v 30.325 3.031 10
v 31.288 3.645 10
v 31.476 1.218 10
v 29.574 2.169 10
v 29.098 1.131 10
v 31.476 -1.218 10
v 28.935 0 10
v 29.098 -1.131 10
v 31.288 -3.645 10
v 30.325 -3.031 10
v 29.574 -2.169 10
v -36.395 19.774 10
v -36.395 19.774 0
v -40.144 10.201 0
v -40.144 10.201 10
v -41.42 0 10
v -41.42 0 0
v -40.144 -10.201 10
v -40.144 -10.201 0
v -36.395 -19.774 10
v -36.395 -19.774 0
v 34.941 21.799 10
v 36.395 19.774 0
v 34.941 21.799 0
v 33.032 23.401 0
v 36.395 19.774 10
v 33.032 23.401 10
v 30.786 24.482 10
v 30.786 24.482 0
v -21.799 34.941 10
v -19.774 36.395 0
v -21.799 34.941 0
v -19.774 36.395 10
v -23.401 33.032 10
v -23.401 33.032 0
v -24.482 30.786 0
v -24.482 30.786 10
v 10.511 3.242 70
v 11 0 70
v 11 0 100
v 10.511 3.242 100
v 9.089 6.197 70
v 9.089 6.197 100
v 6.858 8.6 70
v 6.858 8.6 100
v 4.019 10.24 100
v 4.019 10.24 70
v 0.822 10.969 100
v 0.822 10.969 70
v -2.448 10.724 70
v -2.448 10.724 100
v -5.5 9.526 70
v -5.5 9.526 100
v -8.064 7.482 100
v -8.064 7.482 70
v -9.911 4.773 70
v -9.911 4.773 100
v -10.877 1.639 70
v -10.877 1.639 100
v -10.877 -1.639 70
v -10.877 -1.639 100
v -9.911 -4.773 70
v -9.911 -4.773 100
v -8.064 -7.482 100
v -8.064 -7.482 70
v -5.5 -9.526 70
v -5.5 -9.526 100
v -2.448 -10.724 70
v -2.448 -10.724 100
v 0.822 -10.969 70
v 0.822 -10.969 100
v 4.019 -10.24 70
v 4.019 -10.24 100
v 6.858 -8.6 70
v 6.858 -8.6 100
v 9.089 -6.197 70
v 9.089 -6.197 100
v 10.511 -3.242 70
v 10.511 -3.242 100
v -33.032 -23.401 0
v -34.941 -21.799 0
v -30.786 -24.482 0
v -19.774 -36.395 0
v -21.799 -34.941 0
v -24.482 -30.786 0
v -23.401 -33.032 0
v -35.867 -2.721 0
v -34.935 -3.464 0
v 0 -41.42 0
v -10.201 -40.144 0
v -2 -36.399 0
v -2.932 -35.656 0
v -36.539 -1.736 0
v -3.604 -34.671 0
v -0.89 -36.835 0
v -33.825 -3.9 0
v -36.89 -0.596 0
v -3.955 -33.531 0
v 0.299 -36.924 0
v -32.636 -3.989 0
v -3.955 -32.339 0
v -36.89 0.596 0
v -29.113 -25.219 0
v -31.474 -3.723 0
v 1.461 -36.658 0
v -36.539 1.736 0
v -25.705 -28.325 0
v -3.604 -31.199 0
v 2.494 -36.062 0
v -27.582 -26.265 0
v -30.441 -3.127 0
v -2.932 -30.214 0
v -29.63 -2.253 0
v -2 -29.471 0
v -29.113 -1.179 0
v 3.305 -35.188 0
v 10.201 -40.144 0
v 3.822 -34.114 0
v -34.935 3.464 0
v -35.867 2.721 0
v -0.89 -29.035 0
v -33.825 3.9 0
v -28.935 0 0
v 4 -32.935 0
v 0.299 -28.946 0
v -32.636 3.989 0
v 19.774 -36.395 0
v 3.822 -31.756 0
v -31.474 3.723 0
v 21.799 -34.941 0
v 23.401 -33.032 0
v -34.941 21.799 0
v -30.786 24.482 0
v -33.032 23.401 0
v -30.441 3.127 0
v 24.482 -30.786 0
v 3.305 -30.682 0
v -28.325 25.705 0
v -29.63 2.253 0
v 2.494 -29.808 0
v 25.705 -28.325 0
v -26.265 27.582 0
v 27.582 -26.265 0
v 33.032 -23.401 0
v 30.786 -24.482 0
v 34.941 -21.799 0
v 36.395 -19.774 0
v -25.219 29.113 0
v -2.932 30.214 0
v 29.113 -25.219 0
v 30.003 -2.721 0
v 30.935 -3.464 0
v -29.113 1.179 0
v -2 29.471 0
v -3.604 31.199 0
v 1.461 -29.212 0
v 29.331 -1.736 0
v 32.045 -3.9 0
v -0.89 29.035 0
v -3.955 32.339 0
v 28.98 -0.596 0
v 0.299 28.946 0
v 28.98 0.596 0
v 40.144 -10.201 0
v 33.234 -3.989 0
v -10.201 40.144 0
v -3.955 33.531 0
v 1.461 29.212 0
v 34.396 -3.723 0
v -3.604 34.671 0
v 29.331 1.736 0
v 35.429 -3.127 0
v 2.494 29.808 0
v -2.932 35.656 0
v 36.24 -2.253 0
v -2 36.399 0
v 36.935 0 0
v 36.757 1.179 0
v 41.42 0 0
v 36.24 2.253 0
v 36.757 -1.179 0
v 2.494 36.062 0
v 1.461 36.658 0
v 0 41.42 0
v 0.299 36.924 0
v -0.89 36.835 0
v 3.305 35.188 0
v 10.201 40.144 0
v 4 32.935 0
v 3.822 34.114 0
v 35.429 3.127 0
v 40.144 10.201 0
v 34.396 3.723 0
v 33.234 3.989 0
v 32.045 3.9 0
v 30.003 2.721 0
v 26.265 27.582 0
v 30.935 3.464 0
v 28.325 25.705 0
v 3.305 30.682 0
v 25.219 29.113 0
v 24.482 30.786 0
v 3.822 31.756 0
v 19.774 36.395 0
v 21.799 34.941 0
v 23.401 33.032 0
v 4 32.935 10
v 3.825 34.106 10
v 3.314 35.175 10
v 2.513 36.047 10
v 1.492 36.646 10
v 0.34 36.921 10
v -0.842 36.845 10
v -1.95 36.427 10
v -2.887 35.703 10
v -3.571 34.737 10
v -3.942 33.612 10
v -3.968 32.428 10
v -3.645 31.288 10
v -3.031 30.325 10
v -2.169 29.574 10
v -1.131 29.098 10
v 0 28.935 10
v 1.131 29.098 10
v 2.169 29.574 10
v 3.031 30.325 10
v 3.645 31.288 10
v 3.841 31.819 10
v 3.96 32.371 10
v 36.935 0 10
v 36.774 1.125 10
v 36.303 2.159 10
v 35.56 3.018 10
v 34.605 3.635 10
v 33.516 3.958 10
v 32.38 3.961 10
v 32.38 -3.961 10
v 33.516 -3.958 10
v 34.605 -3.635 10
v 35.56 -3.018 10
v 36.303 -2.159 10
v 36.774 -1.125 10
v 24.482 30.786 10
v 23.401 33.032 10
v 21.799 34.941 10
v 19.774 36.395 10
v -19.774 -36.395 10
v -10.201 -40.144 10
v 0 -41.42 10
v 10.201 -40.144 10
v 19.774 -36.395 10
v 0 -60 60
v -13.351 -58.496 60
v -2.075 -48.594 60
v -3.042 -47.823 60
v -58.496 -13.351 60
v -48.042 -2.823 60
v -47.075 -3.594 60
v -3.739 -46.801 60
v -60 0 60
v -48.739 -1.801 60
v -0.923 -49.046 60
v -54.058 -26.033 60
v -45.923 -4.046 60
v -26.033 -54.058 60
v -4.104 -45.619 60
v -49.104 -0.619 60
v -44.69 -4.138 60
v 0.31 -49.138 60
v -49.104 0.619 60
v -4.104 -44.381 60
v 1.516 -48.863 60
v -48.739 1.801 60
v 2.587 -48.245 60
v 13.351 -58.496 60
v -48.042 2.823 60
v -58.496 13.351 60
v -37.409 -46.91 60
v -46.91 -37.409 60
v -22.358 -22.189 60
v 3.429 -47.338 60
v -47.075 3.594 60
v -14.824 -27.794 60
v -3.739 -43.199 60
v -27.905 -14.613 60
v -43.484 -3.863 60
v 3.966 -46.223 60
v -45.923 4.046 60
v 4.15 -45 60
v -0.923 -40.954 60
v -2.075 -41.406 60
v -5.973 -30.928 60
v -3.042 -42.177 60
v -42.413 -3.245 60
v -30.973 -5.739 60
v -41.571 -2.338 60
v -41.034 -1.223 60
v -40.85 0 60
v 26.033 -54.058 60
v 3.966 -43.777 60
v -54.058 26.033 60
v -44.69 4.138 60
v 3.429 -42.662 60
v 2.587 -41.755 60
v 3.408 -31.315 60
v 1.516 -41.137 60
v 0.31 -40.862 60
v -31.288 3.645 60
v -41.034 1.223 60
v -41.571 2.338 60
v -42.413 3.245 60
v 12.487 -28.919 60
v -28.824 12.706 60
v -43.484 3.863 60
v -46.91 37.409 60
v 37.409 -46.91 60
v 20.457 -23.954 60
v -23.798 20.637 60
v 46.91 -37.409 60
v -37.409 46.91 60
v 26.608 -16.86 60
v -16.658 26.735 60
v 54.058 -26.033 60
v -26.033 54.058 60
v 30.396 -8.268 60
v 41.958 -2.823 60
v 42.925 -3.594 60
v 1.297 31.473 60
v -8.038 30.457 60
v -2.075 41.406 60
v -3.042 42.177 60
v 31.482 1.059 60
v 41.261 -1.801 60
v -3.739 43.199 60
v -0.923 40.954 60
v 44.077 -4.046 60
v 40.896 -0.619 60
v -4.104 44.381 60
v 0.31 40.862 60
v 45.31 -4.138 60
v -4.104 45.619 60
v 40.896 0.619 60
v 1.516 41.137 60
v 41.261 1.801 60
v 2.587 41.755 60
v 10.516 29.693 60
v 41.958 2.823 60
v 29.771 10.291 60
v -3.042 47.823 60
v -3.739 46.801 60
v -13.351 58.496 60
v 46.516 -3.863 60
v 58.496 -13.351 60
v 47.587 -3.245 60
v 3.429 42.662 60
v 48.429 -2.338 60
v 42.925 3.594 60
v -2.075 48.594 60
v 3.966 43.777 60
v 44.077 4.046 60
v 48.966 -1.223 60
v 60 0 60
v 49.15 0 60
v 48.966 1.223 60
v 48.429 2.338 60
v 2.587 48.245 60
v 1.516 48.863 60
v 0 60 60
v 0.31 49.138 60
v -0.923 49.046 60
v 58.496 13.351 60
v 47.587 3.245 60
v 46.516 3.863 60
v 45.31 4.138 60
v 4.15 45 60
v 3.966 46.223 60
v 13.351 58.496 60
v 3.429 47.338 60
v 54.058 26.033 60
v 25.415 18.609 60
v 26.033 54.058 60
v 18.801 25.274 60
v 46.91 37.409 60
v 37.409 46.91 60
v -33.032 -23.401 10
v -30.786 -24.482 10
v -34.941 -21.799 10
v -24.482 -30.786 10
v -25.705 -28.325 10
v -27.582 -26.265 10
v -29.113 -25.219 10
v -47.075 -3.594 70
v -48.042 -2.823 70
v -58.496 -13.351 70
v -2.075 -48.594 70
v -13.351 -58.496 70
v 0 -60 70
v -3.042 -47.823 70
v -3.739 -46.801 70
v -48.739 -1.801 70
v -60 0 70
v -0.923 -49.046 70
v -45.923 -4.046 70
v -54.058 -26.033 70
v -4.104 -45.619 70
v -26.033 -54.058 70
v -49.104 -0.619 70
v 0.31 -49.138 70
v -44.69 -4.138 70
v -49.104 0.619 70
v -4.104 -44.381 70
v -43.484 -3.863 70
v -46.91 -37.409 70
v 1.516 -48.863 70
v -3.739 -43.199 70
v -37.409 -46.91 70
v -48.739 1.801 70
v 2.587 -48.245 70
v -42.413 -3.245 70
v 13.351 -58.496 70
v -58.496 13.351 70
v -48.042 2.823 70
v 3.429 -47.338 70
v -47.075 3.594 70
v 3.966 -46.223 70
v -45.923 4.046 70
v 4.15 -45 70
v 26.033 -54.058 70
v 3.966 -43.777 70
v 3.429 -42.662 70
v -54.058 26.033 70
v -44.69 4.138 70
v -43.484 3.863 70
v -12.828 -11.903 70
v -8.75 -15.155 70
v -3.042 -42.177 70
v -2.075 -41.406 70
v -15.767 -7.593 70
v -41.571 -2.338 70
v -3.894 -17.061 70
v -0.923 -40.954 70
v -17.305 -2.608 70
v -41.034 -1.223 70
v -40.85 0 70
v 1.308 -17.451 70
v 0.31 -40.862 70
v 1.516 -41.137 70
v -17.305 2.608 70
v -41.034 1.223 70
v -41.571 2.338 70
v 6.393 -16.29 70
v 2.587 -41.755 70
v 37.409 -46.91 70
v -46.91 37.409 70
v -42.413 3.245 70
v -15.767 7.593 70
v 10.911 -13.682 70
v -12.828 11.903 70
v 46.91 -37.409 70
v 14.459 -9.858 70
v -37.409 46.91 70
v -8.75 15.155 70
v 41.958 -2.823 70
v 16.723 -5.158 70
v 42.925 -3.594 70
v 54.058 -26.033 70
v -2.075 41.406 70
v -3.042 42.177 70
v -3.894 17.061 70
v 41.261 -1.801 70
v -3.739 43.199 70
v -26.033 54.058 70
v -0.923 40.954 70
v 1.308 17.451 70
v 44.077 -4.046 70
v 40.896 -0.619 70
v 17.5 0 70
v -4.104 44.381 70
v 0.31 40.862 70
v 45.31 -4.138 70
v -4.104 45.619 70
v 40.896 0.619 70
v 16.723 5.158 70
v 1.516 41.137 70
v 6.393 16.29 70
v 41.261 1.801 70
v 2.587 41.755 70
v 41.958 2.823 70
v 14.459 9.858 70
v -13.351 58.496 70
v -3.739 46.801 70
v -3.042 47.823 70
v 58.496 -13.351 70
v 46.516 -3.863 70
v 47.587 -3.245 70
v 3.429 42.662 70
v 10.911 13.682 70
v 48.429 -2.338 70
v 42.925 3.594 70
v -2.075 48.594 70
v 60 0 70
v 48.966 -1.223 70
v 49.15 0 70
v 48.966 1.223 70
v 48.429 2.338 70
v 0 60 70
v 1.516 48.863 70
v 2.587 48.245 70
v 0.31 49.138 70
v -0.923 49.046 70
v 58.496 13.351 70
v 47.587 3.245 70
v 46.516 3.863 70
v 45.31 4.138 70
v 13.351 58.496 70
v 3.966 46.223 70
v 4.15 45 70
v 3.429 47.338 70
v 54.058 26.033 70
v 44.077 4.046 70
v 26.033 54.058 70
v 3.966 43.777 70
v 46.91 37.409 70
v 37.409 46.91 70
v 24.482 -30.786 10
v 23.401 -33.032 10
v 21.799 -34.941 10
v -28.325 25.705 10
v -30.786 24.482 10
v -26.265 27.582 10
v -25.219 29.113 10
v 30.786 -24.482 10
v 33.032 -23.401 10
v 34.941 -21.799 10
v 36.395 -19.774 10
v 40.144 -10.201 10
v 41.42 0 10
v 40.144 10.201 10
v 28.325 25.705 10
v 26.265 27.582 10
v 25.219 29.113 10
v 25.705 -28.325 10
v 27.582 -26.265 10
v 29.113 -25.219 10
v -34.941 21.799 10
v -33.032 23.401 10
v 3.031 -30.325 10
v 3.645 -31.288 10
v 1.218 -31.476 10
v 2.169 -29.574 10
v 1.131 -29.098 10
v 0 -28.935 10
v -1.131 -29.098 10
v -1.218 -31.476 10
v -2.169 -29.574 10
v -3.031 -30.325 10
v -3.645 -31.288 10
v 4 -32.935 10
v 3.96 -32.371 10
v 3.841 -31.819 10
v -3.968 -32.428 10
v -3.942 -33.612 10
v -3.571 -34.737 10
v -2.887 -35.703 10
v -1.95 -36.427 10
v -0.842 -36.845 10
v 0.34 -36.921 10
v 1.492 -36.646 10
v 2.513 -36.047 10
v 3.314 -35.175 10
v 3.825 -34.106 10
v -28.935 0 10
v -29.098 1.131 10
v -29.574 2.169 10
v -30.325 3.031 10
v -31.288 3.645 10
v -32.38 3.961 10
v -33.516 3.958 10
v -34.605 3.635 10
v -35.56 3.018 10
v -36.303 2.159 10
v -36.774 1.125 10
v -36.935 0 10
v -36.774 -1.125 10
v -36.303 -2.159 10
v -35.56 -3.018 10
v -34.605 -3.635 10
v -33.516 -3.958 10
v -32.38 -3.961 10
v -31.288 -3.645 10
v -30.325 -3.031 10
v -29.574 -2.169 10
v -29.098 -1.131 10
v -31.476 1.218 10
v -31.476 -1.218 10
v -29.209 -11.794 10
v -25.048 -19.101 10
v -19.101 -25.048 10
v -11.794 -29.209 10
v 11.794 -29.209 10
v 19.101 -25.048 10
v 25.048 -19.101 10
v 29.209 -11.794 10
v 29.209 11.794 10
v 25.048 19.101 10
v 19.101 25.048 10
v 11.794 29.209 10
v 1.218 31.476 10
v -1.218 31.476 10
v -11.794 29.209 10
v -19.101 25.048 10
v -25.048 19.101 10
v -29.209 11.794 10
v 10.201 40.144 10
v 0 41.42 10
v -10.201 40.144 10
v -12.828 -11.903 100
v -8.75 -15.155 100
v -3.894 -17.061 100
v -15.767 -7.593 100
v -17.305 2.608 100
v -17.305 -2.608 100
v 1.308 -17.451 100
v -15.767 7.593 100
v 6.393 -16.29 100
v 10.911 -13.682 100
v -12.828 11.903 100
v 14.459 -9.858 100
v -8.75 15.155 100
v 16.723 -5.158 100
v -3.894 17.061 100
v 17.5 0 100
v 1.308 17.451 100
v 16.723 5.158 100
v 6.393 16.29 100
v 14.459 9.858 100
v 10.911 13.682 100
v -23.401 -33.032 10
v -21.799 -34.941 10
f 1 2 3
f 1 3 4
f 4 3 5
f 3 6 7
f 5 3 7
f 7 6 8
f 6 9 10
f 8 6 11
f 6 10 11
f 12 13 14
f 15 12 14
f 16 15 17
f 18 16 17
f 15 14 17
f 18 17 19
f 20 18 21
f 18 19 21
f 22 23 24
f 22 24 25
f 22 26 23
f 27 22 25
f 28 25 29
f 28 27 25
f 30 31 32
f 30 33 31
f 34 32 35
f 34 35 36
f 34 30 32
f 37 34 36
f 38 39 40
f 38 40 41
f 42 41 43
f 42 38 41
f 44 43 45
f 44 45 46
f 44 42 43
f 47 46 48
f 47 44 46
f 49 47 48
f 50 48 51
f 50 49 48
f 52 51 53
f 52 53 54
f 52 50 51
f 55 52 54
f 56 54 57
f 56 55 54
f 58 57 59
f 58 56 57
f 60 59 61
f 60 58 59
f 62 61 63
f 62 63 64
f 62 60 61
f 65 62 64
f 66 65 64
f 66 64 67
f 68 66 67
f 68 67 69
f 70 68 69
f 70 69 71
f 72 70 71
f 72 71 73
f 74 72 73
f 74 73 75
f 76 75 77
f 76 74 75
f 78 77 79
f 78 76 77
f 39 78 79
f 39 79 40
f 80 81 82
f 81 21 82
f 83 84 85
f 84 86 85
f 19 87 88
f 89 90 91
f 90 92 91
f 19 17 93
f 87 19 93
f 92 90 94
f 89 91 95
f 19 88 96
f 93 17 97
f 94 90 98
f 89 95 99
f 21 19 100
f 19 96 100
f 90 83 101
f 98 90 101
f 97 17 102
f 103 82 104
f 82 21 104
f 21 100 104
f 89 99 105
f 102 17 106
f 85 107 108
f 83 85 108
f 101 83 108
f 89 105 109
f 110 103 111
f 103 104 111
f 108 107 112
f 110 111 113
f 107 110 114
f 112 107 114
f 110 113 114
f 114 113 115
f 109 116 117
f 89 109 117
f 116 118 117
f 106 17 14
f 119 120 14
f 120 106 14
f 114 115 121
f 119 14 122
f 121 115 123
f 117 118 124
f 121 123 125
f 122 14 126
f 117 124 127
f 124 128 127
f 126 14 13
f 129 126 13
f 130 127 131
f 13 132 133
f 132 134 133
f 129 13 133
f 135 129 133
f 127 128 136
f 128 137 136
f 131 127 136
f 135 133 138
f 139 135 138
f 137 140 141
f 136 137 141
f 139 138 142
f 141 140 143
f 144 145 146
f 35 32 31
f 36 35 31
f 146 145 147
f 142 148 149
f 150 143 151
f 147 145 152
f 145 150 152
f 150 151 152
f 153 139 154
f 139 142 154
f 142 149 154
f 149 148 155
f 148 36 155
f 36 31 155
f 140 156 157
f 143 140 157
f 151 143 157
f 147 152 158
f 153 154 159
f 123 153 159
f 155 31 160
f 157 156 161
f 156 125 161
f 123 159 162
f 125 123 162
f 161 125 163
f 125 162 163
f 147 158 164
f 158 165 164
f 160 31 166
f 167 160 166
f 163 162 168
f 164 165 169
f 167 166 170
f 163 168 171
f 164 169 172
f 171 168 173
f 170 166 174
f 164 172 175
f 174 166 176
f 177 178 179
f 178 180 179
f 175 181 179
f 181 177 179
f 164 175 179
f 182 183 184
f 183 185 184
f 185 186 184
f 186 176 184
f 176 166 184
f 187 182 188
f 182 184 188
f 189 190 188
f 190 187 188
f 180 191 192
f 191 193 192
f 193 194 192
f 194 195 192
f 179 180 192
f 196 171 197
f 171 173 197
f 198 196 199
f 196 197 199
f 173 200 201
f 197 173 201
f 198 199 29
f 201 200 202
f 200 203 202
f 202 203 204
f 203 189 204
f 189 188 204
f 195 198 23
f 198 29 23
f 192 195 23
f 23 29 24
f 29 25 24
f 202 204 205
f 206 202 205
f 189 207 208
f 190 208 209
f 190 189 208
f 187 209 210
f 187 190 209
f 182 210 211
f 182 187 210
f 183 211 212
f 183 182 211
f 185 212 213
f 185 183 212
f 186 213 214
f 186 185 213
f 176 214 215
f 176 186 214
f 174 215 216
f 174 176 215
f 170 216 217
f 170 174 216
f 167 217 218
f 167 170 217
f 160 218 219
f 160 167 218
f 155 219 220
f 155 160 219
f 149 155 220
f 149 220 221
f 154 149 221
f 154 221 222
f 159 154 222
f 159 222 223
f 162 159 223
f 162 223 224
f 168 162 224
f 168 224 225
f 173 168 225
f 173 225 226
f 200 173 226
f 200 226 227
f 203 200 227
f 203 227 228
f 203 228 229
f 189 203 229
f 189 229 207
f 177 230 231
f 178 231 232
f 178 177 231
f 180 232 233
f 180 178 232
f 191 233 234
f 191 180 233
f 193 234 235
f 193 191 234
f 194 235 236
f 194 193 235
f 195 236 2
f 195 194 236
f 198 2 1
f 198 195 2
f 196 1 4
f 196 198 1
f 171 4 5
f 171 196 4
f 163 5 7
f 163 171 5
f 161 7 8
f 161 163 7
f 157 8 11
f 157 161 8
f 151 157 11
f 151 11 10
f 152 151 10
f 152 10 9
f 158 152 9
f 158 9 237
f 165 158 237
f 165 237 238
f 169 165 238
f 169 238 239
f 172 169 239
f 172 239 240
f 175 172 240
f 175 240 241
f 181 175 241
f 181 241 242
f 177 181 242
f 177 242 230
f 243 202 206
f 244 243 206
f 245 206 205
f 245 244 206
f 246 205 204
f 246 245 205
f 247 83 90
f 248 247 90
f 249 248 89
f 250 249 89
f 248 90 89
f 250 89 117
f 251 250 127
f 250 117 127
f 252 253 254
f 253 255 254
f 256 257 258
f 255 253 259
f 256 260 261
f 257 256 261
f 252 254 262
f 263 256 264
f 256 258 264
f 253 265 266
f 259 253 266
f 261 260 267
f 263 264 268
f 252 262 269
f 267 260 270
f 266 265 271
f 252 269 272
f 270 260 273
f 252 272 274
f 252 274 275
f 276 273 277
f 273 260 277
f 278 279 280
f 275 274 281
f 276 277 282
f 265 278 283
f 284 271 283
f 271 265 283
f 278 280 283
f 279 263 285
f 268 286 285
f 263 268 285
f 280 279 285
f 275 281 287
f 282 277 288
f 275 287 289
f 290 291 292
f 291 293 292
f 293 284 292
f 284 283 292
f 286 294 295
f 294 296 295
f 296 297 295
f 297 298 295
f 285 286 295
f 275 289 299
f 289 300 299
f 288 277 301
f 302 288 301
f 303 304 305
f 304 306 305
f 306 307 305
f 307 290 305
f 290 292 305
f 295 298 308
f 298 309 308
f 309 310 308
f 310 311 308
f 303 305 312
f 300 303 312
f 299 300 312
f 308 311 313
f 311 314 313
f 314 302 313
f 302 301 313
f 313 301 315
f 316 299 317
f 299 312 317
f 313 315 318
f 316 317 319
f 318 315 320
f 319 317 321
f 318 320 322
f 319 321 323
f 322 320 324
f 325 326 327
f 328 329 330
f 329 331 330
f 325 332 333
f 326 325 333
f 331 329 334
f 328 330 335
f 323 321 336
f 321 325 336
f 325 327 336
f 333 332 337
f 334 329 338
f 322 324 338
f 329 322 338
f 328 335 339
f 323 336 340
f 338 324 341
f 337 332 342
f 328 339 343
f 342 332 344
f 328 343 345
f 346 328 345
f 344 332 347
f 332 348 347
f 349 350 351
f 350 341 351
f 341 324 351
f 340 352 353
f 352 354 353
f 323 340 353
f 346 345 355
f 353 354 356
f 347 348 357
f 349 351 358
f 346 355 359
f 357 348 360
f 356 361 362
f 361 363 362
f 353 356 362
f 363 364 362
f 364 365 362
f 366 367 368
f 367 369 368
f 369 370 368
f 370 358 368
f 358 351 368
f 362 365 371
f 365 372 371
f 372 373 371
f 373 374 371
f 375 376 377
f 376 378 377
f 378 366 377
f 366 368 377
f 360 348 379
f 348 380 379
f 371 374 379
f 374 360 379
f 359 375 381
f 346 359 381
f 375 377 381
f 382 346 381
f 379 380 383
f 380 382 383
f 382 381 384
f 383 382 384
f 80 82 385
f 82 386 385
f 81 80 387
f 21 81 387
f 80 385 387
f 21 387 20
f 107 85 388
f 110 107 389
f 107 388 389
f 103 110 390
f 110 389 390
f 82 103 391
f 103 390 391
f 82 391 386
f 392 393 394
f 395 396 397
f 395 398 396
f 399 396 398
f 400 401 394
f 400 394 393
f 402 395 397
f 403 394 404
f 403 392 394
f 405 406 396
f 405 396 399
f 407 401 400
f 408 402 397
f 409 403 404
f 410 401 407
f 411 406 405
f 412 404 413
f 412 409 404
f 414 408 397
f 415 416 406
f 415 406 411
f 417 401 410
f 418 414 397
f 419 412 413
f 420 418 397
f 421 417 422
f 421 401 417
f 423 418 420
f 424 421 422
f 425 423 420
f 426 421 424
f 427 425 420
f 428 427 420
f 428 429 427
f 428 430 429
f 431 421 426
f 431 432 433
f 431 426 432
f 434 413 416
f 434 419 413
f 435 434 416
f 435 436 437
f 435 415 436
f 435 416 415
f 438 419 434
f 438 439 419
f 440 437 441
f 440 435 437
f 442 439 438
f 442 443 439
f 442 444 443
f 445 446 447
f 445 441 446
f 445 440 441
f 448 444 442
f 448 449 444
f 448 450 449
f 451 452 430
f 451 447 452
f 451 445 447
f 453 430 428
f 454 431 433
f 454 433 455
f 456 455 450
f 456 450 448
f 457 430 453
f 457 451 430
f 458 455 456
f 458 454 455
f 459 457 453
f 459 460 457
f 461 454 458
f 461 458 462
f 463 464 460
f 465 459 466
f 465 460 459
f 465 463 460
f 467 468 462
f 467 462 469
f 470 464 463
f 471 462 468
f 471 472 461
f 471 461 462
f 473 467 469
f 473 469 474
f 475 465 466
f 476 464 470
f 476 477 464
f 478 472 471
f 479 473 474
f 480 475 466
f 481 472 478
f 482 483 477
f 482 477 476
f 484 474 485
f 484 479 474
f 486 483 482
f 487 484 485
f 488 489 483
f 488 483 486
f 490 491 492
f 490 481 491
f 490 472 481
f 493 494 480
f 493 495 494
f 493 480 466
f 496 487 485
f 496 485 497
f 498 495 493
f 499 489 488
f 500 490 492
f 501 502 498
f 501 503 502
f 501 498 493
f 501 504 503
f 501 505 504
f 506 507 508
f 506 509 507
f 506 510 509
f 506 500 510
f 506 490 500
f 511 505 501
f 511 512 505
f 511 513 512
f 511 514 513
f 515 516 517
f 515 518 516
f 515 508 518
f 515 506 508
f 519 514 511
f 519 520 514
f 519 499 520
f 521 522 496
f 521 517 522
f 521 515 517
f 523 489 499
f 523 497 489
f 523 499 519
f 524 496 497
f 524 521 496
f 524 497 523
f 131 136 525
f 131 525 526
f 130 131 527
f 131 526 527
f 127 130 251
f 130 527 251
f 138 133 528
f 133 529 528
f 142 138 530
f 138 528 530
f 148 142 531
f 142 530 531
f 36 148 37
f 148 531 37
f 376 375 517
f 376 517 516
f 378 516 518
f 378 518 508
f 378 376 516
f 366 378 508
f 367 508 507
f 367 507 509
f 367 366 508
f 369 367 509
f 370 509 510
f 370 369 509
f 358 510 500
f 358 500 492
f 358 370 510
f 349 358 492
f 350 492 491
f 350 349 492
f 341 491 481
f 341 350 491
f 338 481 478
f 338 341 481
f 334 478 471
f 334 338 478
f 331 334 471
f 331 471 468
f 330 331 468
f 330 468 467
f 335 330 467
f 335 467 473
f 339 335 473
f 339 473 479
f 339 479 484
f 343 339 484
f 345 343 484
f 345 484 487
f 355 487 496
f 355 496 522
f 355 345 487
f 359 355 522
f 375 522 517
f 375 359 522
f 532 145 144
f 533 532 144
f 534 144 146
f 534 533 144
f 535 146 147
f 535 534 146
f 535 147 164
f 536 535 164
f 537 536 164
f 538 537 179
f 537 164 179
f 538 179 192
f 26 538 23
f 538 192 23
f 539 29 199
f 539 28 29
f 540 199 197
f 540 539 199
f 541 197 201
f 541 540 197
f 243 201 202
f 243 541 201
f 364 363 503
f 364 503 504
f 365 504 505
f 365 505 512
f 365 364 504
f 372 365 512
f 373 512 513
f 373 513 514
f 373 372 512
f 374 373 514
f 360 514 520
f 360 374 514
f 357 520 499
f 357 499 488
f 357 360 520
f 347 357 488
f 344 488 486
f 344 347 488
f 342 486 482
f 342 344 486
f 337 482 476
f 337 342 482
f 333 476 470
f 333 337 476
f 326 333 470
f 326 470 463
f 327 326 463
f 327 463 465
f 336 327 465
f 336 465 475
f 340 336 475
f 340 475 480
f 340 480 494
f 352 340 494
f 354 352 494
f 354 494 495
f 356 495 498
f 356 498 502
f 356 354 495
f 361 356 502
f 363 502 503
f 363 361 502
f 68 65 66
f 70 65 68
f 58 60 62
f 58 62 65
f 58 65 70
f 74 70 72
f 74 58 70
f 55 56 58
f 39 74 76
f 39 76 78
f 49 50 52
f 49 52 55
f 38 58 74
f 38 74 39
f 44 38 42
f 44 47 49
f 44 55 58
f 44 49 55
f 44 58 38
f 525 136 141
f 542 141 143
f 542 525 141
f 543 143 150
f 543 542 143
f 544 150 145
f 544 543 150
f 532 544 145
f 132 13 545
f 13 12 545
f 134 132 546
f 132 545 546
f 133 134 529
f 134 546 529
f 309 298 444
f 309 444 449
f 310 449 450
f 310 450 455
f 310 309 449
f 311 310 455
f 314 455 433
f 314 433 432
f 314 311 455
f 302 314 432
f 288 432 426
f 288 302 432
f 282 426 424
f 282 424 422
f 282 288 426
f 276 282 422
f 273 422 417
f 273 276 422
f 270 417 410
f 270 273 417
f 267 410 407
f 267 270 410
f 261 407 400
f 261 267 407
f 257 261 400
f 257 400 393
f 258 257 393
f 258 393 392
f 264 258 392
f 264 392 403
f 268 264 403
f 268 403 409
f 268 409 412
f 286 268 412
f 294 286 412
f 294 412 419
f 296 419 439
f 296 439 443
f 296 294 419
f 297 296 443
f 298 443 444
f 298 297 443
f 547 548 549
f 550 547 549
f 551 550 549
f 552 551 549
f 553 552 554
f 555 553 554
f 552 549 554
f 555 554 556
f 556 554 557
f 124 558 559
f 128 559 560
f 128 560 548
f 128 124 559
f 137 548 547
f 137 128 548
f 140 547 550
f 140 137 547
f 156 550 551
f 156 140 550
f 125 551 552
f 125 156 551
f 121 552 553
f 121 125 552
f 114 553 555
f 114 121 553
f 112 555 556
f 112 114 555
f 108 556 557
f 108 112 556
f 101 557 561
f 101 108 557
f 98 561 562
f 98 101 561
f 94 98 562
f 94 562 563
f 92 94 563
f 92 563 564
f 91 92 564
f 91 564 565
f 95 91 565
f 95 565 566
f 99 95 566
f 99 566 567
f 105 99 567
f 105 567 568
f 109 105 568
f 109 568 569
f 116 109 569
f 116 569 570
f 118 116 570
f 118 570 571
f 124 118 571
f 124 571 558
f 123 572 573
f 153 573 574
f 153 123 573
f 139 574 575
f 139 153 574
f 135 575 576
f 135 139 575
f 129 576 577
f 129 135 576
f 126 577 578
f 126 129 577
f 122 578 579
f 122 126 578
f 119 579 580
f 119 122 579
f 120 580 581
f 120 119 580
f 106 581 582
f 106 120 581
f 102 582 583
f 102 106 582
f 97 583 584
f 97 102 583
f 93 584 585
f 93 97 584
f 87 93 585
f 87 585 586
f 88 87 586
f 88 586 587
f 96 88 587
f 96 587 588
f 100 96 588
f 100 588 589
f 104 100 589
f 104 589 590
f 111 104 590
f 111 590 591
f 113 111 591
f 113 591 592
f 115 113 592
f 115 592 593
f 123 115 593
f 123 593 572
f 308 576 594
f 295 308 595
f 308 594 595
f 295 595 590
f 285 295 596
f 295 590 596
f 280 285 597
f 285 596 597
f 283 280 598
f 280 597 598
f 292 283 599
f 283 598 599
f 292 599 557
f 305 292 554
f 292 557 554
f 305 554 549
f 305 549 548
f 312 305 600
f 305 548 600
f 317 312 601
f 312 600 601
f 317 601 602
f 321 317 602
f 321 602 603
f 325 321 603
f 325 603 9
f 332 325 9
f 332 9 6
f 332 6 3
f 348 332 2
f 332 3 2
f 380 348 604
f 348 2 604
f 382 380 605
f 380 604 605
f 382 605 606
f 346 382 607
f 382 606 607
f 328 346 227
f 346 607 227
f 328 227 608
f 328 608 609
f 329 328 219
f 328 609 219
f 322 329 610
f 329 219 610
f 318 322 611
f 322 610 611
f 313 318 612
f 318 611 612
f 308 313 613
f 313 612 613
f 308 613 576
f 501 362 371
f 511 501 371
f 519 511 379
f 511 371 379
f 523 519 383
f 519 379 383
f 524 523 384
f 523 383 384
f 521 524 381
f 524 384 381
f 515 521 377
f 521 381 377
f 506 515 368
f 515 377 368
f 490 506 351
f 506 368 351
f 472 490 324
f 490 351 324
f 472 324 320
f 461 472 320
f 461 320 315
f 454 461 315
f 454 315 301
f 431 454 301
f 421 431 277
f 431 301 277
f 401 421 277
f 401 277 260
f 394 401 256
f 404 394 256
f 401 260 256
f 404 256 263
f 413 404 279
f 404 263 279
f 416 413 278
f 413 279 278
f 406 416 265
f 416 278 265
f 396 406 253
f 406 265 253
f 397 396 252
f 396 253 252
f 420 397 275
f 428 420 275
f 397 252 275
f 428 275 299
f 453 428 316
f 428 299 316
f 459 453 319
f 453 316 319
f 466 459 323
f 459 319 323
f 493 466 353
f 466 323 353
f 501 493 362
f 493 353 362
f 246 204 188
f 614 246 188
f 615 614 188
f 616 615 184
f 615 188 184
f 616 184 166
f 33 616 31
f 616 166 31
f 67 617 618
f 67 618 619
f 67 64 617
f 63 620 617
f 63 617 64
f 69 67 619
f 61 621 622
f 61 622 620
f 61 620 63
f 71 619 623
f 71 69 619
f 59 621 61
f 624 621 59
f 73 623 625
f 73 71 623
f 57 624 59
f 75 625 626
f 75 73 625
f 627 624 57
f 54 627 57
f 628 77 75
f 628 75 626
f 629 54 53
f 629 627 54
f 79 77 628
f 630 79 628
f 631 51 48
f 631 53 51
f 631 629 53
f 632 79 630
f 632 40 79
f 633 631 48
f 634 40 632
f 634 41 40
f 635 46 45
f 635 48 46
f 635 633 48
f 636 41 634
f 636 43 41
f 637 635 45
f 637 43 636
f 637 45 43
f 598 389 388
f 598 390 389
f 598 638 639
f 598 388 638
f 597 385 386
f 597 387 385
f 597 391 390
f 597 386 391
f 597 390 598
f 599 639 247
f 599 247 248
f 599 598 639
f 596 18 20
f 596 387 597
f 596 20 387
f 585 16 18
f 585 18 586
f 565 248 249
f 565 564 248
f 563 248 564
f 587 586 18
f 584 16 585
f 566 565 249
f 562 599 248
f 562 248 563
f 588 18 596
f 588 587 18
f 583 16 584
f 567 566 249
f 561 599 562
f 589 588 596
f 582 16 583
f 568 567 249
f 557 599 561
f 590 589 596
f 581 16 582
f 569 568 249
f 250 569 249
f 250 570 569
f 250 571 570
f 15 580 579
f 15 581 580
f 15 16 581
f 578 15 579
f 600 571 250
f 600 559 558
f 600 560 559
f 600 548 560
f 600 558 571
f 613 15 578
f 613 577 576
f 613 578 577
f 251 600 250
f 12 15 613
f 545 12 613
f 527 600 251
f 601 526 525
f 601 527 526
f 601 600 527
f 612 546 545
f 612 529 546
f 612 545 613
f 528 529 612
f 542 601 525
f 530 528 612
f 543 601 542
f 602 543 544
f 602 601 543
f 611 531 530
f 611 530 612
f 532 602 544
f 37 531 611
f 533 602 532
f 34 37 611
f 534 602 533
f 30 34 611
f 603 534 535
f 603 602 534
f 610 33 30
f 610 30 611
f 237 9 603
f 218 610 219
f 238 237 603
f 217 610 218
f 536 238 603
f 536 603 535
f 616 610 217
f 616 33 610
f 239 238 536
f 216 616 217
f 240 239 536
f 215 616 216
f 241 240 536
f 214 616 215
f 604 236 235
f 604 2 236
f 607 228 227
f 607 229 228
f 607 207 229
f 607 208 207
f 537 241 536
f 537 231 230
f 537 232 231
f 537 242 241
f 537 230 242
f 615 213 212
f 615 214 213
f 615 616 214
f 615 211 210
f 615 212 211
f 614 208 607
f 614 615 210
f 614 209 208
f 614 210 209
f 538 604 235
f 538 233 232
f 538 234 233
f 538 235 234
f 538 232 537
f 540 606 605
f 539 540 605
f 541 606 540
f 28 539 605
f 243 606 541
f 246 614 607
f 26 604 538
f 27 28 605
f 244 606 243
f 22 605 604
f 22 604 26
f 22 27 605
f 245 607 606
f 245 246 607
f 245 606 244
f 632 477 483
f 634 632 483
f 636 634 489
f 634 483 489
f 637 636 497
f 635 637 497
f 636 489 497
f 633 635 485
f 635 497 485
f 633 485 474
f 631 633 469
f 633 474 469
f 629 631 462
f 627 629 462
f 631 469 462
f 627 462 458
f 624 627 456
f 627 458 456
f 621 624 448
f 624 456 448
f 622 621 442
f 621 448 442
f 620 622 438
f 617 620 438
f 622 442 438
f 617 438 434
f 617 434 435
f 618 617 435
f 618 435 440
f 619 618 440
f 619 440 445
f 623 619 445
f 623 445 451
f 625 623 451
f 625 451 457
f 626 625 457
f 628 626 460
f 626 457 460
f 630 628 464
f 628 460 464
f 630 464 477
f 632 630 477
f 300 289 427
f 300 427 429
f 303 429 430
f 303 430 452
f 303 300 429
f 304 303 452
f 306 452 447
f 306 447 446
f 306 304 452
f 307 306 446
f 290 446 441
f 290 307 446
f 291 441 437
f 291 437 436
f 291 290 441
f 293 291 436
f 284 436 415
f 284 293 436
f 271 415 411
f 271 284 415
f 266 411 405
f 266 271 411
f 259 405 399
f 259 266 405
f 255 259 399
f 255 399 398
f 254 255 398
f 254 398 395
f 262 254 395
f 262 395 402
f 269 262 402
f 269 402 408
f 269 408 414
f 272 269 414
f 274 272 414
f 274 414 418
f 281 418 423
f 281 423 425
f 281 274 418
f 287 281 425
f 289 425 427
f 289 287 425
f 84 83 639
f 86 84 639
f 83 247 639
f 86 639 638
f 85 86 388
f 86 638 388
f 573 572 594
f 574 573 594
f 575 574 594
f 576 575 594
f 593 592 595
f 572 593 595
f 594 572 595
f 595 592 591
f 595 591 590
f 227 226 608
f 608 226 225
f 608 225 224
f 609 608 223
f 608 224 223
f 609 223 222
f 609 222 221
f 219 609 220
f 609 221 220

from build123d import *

# Parameters (mm, degrees)
SKETCH1_W           = 50
SKETCH1_H           = 50
SKETCH1_R           = 4
BOSS_EXTRUDE1_DEPTH = 10
FILLET1_R           = 10
FILLET2_R           = 10
SKETCH2_R           = 31.5
BOSS_EXTRUDE2_DEPTH = 50
SKETCH3_R           = 60
SKETCH3_R_2         = 4.15
BOSS_EXTRUDE3_DEPTH = 10
SKETCH4_R           = 17.5
SKETCH4_R_2         = 11
BOSS_EXTRUDE4_DEPTH = 30


with BuildPart() as part:
    # Sketch1 → Boss-Extrude1 (new body)
    # profile 1 of 5: a face of its own
    with BuildSketch(Plane.XY):
        Rectangle(SKETCH1_W, SKETCH1_H)
    # profile 2 of 5: a face of its own
    with BuildSketch(Plane.XY):
        with BuildLine():
            Line((-25, -25), (-25, 25))
            Line((-25, 25), (-33.024481828, 25))
            ThreePointArc((-33.024481828, 25), (-41.42, 0), (-33.024481828, -25))
            Line((-33.024481828, -25), (-25, -25))
        make_face()
        with Locations((-32.935, 0)):
            Circle(SKETCH1_R, mode=Mode.SUBTRACT)
    # profile 3 of 5: a face of its own
    with BuildSketch(Plane.XY):
        with BuildLine():
            Line((25, 25), (25, 33.024481828))
            ThreePointArc((25, 33.024481828), (0, 41.42), (-25, 33.024481828))
            Line((-25, 33.024481828), (-25, 25))
            Line((-25, 25), (25, 25))
        make_face()
        with Locations((0, 32.935)):
            Circle(SKETCH1_R, mode=Mode.SUBTRACT)
    # profile 4 of 5: a face of its own
    with BuildSketch(Plane.XY):
        with BuildLine():
            Line((33.024481828, 25), (25, 25))
            Line((25, 25), (25, -25))
            Line((25, -25), (33.024481828, -25))
            ThreePointArc((33.024481828, -25), (41.42, 0), (33.024481828, 25))
        make_face()
        with Locations((32.935, 0)):
            Circle(SKETCH1_R, mode=Mode.SUBTRACT)
    # profile 5 of 5: a face of its own
    with BuildSketch(Plane.XY):
        with BuildLine():
            Line((25, -33.024481828), (25, -25))
            Line((25, -25), (-25, -25))
            Line((-25, -25), (-25, -33.024481828))
            ThreePointArc((-25, -33.024481828), (0, -41.42), (25, -33.024481828))
        make_face()
        with Locations((0, -32.935)):
            Circle(SKETCH1_R, mode=Mode.SUBTRACT)
    extrude(amount=BOSS_EXTRUDE1_DEPTH)

    # Fillet1
    fillet1_edges = [part.edges().sort_by_distance(p)[0] for p in [
        (-25, 33.024481828, 5),
        (25, 33.024481828, 5),
        (33.024481828, 25, 5),
        (33.024481828, -25, 5),
        (25, -33.024481828, 5),
        (-25, -33.024481828, 5),
        (-33.024481828, -25, 5),
        (-33.024481828, 25, 5),
    ]]
    fillet(fillet1_edges, radius=FILLET1_R)

    # Fillet2
    fillet2_edges = [part.edges().sort_by_distance(p)[0] for p in [
        (25, 25, 5),
        (-25, 25, 5),
        (-25, -25, 5),
        (25, -25, 5),
    ]]
    fillet(fillet2_edges, radius=FILLET2_R)

    # Sketch2 → Boss-Extrude2 (add)
    with BuildSketch(Plane.XY.offset(10)):
        with Locations(Location((0, 0, 0), (0, 0, 173.354533999))):
            Circle(SKETCH2_R)
    extrude(amount=BOSS_EXTRUDE2_DEPTH)

    # Sketch3 → Boss-Extrude3 (add)
    with BuildSketch(Plane.XY.offset(60)):
        Circle(SKETCH3_R)
        with Locations((0, 45)):
            Circle(SKETCH3_R_2, mode=Mode.SUBTRACT)
        with Locations((45, 0)):
            Circle(SKETCH3_R_2, mode=Mode.SUBTRACT)
        with Locations((0, -45)):
            Circle(SKETCH3_R_2, mode=Mode.SUBTRACT)
        with Locations((-45, 0)):
            Circle(SKETCH3_R_2, mode=Mode.SUBTRACT)
    extrude(amount=BOSS_EXTRUDE3_DEPTH)

    # Sketch4 → Boss-Extrude4 (add)
    with BuildSketch(Plane.XY.offset(70)):
        Circle(SKETCH4_R)
        Circle(SKETCH4_R_2, mode=Mode.SUBTRACT)
    extrude(amount=BOSS_EXTRUDE4_DEPTH)


solid = part.part
